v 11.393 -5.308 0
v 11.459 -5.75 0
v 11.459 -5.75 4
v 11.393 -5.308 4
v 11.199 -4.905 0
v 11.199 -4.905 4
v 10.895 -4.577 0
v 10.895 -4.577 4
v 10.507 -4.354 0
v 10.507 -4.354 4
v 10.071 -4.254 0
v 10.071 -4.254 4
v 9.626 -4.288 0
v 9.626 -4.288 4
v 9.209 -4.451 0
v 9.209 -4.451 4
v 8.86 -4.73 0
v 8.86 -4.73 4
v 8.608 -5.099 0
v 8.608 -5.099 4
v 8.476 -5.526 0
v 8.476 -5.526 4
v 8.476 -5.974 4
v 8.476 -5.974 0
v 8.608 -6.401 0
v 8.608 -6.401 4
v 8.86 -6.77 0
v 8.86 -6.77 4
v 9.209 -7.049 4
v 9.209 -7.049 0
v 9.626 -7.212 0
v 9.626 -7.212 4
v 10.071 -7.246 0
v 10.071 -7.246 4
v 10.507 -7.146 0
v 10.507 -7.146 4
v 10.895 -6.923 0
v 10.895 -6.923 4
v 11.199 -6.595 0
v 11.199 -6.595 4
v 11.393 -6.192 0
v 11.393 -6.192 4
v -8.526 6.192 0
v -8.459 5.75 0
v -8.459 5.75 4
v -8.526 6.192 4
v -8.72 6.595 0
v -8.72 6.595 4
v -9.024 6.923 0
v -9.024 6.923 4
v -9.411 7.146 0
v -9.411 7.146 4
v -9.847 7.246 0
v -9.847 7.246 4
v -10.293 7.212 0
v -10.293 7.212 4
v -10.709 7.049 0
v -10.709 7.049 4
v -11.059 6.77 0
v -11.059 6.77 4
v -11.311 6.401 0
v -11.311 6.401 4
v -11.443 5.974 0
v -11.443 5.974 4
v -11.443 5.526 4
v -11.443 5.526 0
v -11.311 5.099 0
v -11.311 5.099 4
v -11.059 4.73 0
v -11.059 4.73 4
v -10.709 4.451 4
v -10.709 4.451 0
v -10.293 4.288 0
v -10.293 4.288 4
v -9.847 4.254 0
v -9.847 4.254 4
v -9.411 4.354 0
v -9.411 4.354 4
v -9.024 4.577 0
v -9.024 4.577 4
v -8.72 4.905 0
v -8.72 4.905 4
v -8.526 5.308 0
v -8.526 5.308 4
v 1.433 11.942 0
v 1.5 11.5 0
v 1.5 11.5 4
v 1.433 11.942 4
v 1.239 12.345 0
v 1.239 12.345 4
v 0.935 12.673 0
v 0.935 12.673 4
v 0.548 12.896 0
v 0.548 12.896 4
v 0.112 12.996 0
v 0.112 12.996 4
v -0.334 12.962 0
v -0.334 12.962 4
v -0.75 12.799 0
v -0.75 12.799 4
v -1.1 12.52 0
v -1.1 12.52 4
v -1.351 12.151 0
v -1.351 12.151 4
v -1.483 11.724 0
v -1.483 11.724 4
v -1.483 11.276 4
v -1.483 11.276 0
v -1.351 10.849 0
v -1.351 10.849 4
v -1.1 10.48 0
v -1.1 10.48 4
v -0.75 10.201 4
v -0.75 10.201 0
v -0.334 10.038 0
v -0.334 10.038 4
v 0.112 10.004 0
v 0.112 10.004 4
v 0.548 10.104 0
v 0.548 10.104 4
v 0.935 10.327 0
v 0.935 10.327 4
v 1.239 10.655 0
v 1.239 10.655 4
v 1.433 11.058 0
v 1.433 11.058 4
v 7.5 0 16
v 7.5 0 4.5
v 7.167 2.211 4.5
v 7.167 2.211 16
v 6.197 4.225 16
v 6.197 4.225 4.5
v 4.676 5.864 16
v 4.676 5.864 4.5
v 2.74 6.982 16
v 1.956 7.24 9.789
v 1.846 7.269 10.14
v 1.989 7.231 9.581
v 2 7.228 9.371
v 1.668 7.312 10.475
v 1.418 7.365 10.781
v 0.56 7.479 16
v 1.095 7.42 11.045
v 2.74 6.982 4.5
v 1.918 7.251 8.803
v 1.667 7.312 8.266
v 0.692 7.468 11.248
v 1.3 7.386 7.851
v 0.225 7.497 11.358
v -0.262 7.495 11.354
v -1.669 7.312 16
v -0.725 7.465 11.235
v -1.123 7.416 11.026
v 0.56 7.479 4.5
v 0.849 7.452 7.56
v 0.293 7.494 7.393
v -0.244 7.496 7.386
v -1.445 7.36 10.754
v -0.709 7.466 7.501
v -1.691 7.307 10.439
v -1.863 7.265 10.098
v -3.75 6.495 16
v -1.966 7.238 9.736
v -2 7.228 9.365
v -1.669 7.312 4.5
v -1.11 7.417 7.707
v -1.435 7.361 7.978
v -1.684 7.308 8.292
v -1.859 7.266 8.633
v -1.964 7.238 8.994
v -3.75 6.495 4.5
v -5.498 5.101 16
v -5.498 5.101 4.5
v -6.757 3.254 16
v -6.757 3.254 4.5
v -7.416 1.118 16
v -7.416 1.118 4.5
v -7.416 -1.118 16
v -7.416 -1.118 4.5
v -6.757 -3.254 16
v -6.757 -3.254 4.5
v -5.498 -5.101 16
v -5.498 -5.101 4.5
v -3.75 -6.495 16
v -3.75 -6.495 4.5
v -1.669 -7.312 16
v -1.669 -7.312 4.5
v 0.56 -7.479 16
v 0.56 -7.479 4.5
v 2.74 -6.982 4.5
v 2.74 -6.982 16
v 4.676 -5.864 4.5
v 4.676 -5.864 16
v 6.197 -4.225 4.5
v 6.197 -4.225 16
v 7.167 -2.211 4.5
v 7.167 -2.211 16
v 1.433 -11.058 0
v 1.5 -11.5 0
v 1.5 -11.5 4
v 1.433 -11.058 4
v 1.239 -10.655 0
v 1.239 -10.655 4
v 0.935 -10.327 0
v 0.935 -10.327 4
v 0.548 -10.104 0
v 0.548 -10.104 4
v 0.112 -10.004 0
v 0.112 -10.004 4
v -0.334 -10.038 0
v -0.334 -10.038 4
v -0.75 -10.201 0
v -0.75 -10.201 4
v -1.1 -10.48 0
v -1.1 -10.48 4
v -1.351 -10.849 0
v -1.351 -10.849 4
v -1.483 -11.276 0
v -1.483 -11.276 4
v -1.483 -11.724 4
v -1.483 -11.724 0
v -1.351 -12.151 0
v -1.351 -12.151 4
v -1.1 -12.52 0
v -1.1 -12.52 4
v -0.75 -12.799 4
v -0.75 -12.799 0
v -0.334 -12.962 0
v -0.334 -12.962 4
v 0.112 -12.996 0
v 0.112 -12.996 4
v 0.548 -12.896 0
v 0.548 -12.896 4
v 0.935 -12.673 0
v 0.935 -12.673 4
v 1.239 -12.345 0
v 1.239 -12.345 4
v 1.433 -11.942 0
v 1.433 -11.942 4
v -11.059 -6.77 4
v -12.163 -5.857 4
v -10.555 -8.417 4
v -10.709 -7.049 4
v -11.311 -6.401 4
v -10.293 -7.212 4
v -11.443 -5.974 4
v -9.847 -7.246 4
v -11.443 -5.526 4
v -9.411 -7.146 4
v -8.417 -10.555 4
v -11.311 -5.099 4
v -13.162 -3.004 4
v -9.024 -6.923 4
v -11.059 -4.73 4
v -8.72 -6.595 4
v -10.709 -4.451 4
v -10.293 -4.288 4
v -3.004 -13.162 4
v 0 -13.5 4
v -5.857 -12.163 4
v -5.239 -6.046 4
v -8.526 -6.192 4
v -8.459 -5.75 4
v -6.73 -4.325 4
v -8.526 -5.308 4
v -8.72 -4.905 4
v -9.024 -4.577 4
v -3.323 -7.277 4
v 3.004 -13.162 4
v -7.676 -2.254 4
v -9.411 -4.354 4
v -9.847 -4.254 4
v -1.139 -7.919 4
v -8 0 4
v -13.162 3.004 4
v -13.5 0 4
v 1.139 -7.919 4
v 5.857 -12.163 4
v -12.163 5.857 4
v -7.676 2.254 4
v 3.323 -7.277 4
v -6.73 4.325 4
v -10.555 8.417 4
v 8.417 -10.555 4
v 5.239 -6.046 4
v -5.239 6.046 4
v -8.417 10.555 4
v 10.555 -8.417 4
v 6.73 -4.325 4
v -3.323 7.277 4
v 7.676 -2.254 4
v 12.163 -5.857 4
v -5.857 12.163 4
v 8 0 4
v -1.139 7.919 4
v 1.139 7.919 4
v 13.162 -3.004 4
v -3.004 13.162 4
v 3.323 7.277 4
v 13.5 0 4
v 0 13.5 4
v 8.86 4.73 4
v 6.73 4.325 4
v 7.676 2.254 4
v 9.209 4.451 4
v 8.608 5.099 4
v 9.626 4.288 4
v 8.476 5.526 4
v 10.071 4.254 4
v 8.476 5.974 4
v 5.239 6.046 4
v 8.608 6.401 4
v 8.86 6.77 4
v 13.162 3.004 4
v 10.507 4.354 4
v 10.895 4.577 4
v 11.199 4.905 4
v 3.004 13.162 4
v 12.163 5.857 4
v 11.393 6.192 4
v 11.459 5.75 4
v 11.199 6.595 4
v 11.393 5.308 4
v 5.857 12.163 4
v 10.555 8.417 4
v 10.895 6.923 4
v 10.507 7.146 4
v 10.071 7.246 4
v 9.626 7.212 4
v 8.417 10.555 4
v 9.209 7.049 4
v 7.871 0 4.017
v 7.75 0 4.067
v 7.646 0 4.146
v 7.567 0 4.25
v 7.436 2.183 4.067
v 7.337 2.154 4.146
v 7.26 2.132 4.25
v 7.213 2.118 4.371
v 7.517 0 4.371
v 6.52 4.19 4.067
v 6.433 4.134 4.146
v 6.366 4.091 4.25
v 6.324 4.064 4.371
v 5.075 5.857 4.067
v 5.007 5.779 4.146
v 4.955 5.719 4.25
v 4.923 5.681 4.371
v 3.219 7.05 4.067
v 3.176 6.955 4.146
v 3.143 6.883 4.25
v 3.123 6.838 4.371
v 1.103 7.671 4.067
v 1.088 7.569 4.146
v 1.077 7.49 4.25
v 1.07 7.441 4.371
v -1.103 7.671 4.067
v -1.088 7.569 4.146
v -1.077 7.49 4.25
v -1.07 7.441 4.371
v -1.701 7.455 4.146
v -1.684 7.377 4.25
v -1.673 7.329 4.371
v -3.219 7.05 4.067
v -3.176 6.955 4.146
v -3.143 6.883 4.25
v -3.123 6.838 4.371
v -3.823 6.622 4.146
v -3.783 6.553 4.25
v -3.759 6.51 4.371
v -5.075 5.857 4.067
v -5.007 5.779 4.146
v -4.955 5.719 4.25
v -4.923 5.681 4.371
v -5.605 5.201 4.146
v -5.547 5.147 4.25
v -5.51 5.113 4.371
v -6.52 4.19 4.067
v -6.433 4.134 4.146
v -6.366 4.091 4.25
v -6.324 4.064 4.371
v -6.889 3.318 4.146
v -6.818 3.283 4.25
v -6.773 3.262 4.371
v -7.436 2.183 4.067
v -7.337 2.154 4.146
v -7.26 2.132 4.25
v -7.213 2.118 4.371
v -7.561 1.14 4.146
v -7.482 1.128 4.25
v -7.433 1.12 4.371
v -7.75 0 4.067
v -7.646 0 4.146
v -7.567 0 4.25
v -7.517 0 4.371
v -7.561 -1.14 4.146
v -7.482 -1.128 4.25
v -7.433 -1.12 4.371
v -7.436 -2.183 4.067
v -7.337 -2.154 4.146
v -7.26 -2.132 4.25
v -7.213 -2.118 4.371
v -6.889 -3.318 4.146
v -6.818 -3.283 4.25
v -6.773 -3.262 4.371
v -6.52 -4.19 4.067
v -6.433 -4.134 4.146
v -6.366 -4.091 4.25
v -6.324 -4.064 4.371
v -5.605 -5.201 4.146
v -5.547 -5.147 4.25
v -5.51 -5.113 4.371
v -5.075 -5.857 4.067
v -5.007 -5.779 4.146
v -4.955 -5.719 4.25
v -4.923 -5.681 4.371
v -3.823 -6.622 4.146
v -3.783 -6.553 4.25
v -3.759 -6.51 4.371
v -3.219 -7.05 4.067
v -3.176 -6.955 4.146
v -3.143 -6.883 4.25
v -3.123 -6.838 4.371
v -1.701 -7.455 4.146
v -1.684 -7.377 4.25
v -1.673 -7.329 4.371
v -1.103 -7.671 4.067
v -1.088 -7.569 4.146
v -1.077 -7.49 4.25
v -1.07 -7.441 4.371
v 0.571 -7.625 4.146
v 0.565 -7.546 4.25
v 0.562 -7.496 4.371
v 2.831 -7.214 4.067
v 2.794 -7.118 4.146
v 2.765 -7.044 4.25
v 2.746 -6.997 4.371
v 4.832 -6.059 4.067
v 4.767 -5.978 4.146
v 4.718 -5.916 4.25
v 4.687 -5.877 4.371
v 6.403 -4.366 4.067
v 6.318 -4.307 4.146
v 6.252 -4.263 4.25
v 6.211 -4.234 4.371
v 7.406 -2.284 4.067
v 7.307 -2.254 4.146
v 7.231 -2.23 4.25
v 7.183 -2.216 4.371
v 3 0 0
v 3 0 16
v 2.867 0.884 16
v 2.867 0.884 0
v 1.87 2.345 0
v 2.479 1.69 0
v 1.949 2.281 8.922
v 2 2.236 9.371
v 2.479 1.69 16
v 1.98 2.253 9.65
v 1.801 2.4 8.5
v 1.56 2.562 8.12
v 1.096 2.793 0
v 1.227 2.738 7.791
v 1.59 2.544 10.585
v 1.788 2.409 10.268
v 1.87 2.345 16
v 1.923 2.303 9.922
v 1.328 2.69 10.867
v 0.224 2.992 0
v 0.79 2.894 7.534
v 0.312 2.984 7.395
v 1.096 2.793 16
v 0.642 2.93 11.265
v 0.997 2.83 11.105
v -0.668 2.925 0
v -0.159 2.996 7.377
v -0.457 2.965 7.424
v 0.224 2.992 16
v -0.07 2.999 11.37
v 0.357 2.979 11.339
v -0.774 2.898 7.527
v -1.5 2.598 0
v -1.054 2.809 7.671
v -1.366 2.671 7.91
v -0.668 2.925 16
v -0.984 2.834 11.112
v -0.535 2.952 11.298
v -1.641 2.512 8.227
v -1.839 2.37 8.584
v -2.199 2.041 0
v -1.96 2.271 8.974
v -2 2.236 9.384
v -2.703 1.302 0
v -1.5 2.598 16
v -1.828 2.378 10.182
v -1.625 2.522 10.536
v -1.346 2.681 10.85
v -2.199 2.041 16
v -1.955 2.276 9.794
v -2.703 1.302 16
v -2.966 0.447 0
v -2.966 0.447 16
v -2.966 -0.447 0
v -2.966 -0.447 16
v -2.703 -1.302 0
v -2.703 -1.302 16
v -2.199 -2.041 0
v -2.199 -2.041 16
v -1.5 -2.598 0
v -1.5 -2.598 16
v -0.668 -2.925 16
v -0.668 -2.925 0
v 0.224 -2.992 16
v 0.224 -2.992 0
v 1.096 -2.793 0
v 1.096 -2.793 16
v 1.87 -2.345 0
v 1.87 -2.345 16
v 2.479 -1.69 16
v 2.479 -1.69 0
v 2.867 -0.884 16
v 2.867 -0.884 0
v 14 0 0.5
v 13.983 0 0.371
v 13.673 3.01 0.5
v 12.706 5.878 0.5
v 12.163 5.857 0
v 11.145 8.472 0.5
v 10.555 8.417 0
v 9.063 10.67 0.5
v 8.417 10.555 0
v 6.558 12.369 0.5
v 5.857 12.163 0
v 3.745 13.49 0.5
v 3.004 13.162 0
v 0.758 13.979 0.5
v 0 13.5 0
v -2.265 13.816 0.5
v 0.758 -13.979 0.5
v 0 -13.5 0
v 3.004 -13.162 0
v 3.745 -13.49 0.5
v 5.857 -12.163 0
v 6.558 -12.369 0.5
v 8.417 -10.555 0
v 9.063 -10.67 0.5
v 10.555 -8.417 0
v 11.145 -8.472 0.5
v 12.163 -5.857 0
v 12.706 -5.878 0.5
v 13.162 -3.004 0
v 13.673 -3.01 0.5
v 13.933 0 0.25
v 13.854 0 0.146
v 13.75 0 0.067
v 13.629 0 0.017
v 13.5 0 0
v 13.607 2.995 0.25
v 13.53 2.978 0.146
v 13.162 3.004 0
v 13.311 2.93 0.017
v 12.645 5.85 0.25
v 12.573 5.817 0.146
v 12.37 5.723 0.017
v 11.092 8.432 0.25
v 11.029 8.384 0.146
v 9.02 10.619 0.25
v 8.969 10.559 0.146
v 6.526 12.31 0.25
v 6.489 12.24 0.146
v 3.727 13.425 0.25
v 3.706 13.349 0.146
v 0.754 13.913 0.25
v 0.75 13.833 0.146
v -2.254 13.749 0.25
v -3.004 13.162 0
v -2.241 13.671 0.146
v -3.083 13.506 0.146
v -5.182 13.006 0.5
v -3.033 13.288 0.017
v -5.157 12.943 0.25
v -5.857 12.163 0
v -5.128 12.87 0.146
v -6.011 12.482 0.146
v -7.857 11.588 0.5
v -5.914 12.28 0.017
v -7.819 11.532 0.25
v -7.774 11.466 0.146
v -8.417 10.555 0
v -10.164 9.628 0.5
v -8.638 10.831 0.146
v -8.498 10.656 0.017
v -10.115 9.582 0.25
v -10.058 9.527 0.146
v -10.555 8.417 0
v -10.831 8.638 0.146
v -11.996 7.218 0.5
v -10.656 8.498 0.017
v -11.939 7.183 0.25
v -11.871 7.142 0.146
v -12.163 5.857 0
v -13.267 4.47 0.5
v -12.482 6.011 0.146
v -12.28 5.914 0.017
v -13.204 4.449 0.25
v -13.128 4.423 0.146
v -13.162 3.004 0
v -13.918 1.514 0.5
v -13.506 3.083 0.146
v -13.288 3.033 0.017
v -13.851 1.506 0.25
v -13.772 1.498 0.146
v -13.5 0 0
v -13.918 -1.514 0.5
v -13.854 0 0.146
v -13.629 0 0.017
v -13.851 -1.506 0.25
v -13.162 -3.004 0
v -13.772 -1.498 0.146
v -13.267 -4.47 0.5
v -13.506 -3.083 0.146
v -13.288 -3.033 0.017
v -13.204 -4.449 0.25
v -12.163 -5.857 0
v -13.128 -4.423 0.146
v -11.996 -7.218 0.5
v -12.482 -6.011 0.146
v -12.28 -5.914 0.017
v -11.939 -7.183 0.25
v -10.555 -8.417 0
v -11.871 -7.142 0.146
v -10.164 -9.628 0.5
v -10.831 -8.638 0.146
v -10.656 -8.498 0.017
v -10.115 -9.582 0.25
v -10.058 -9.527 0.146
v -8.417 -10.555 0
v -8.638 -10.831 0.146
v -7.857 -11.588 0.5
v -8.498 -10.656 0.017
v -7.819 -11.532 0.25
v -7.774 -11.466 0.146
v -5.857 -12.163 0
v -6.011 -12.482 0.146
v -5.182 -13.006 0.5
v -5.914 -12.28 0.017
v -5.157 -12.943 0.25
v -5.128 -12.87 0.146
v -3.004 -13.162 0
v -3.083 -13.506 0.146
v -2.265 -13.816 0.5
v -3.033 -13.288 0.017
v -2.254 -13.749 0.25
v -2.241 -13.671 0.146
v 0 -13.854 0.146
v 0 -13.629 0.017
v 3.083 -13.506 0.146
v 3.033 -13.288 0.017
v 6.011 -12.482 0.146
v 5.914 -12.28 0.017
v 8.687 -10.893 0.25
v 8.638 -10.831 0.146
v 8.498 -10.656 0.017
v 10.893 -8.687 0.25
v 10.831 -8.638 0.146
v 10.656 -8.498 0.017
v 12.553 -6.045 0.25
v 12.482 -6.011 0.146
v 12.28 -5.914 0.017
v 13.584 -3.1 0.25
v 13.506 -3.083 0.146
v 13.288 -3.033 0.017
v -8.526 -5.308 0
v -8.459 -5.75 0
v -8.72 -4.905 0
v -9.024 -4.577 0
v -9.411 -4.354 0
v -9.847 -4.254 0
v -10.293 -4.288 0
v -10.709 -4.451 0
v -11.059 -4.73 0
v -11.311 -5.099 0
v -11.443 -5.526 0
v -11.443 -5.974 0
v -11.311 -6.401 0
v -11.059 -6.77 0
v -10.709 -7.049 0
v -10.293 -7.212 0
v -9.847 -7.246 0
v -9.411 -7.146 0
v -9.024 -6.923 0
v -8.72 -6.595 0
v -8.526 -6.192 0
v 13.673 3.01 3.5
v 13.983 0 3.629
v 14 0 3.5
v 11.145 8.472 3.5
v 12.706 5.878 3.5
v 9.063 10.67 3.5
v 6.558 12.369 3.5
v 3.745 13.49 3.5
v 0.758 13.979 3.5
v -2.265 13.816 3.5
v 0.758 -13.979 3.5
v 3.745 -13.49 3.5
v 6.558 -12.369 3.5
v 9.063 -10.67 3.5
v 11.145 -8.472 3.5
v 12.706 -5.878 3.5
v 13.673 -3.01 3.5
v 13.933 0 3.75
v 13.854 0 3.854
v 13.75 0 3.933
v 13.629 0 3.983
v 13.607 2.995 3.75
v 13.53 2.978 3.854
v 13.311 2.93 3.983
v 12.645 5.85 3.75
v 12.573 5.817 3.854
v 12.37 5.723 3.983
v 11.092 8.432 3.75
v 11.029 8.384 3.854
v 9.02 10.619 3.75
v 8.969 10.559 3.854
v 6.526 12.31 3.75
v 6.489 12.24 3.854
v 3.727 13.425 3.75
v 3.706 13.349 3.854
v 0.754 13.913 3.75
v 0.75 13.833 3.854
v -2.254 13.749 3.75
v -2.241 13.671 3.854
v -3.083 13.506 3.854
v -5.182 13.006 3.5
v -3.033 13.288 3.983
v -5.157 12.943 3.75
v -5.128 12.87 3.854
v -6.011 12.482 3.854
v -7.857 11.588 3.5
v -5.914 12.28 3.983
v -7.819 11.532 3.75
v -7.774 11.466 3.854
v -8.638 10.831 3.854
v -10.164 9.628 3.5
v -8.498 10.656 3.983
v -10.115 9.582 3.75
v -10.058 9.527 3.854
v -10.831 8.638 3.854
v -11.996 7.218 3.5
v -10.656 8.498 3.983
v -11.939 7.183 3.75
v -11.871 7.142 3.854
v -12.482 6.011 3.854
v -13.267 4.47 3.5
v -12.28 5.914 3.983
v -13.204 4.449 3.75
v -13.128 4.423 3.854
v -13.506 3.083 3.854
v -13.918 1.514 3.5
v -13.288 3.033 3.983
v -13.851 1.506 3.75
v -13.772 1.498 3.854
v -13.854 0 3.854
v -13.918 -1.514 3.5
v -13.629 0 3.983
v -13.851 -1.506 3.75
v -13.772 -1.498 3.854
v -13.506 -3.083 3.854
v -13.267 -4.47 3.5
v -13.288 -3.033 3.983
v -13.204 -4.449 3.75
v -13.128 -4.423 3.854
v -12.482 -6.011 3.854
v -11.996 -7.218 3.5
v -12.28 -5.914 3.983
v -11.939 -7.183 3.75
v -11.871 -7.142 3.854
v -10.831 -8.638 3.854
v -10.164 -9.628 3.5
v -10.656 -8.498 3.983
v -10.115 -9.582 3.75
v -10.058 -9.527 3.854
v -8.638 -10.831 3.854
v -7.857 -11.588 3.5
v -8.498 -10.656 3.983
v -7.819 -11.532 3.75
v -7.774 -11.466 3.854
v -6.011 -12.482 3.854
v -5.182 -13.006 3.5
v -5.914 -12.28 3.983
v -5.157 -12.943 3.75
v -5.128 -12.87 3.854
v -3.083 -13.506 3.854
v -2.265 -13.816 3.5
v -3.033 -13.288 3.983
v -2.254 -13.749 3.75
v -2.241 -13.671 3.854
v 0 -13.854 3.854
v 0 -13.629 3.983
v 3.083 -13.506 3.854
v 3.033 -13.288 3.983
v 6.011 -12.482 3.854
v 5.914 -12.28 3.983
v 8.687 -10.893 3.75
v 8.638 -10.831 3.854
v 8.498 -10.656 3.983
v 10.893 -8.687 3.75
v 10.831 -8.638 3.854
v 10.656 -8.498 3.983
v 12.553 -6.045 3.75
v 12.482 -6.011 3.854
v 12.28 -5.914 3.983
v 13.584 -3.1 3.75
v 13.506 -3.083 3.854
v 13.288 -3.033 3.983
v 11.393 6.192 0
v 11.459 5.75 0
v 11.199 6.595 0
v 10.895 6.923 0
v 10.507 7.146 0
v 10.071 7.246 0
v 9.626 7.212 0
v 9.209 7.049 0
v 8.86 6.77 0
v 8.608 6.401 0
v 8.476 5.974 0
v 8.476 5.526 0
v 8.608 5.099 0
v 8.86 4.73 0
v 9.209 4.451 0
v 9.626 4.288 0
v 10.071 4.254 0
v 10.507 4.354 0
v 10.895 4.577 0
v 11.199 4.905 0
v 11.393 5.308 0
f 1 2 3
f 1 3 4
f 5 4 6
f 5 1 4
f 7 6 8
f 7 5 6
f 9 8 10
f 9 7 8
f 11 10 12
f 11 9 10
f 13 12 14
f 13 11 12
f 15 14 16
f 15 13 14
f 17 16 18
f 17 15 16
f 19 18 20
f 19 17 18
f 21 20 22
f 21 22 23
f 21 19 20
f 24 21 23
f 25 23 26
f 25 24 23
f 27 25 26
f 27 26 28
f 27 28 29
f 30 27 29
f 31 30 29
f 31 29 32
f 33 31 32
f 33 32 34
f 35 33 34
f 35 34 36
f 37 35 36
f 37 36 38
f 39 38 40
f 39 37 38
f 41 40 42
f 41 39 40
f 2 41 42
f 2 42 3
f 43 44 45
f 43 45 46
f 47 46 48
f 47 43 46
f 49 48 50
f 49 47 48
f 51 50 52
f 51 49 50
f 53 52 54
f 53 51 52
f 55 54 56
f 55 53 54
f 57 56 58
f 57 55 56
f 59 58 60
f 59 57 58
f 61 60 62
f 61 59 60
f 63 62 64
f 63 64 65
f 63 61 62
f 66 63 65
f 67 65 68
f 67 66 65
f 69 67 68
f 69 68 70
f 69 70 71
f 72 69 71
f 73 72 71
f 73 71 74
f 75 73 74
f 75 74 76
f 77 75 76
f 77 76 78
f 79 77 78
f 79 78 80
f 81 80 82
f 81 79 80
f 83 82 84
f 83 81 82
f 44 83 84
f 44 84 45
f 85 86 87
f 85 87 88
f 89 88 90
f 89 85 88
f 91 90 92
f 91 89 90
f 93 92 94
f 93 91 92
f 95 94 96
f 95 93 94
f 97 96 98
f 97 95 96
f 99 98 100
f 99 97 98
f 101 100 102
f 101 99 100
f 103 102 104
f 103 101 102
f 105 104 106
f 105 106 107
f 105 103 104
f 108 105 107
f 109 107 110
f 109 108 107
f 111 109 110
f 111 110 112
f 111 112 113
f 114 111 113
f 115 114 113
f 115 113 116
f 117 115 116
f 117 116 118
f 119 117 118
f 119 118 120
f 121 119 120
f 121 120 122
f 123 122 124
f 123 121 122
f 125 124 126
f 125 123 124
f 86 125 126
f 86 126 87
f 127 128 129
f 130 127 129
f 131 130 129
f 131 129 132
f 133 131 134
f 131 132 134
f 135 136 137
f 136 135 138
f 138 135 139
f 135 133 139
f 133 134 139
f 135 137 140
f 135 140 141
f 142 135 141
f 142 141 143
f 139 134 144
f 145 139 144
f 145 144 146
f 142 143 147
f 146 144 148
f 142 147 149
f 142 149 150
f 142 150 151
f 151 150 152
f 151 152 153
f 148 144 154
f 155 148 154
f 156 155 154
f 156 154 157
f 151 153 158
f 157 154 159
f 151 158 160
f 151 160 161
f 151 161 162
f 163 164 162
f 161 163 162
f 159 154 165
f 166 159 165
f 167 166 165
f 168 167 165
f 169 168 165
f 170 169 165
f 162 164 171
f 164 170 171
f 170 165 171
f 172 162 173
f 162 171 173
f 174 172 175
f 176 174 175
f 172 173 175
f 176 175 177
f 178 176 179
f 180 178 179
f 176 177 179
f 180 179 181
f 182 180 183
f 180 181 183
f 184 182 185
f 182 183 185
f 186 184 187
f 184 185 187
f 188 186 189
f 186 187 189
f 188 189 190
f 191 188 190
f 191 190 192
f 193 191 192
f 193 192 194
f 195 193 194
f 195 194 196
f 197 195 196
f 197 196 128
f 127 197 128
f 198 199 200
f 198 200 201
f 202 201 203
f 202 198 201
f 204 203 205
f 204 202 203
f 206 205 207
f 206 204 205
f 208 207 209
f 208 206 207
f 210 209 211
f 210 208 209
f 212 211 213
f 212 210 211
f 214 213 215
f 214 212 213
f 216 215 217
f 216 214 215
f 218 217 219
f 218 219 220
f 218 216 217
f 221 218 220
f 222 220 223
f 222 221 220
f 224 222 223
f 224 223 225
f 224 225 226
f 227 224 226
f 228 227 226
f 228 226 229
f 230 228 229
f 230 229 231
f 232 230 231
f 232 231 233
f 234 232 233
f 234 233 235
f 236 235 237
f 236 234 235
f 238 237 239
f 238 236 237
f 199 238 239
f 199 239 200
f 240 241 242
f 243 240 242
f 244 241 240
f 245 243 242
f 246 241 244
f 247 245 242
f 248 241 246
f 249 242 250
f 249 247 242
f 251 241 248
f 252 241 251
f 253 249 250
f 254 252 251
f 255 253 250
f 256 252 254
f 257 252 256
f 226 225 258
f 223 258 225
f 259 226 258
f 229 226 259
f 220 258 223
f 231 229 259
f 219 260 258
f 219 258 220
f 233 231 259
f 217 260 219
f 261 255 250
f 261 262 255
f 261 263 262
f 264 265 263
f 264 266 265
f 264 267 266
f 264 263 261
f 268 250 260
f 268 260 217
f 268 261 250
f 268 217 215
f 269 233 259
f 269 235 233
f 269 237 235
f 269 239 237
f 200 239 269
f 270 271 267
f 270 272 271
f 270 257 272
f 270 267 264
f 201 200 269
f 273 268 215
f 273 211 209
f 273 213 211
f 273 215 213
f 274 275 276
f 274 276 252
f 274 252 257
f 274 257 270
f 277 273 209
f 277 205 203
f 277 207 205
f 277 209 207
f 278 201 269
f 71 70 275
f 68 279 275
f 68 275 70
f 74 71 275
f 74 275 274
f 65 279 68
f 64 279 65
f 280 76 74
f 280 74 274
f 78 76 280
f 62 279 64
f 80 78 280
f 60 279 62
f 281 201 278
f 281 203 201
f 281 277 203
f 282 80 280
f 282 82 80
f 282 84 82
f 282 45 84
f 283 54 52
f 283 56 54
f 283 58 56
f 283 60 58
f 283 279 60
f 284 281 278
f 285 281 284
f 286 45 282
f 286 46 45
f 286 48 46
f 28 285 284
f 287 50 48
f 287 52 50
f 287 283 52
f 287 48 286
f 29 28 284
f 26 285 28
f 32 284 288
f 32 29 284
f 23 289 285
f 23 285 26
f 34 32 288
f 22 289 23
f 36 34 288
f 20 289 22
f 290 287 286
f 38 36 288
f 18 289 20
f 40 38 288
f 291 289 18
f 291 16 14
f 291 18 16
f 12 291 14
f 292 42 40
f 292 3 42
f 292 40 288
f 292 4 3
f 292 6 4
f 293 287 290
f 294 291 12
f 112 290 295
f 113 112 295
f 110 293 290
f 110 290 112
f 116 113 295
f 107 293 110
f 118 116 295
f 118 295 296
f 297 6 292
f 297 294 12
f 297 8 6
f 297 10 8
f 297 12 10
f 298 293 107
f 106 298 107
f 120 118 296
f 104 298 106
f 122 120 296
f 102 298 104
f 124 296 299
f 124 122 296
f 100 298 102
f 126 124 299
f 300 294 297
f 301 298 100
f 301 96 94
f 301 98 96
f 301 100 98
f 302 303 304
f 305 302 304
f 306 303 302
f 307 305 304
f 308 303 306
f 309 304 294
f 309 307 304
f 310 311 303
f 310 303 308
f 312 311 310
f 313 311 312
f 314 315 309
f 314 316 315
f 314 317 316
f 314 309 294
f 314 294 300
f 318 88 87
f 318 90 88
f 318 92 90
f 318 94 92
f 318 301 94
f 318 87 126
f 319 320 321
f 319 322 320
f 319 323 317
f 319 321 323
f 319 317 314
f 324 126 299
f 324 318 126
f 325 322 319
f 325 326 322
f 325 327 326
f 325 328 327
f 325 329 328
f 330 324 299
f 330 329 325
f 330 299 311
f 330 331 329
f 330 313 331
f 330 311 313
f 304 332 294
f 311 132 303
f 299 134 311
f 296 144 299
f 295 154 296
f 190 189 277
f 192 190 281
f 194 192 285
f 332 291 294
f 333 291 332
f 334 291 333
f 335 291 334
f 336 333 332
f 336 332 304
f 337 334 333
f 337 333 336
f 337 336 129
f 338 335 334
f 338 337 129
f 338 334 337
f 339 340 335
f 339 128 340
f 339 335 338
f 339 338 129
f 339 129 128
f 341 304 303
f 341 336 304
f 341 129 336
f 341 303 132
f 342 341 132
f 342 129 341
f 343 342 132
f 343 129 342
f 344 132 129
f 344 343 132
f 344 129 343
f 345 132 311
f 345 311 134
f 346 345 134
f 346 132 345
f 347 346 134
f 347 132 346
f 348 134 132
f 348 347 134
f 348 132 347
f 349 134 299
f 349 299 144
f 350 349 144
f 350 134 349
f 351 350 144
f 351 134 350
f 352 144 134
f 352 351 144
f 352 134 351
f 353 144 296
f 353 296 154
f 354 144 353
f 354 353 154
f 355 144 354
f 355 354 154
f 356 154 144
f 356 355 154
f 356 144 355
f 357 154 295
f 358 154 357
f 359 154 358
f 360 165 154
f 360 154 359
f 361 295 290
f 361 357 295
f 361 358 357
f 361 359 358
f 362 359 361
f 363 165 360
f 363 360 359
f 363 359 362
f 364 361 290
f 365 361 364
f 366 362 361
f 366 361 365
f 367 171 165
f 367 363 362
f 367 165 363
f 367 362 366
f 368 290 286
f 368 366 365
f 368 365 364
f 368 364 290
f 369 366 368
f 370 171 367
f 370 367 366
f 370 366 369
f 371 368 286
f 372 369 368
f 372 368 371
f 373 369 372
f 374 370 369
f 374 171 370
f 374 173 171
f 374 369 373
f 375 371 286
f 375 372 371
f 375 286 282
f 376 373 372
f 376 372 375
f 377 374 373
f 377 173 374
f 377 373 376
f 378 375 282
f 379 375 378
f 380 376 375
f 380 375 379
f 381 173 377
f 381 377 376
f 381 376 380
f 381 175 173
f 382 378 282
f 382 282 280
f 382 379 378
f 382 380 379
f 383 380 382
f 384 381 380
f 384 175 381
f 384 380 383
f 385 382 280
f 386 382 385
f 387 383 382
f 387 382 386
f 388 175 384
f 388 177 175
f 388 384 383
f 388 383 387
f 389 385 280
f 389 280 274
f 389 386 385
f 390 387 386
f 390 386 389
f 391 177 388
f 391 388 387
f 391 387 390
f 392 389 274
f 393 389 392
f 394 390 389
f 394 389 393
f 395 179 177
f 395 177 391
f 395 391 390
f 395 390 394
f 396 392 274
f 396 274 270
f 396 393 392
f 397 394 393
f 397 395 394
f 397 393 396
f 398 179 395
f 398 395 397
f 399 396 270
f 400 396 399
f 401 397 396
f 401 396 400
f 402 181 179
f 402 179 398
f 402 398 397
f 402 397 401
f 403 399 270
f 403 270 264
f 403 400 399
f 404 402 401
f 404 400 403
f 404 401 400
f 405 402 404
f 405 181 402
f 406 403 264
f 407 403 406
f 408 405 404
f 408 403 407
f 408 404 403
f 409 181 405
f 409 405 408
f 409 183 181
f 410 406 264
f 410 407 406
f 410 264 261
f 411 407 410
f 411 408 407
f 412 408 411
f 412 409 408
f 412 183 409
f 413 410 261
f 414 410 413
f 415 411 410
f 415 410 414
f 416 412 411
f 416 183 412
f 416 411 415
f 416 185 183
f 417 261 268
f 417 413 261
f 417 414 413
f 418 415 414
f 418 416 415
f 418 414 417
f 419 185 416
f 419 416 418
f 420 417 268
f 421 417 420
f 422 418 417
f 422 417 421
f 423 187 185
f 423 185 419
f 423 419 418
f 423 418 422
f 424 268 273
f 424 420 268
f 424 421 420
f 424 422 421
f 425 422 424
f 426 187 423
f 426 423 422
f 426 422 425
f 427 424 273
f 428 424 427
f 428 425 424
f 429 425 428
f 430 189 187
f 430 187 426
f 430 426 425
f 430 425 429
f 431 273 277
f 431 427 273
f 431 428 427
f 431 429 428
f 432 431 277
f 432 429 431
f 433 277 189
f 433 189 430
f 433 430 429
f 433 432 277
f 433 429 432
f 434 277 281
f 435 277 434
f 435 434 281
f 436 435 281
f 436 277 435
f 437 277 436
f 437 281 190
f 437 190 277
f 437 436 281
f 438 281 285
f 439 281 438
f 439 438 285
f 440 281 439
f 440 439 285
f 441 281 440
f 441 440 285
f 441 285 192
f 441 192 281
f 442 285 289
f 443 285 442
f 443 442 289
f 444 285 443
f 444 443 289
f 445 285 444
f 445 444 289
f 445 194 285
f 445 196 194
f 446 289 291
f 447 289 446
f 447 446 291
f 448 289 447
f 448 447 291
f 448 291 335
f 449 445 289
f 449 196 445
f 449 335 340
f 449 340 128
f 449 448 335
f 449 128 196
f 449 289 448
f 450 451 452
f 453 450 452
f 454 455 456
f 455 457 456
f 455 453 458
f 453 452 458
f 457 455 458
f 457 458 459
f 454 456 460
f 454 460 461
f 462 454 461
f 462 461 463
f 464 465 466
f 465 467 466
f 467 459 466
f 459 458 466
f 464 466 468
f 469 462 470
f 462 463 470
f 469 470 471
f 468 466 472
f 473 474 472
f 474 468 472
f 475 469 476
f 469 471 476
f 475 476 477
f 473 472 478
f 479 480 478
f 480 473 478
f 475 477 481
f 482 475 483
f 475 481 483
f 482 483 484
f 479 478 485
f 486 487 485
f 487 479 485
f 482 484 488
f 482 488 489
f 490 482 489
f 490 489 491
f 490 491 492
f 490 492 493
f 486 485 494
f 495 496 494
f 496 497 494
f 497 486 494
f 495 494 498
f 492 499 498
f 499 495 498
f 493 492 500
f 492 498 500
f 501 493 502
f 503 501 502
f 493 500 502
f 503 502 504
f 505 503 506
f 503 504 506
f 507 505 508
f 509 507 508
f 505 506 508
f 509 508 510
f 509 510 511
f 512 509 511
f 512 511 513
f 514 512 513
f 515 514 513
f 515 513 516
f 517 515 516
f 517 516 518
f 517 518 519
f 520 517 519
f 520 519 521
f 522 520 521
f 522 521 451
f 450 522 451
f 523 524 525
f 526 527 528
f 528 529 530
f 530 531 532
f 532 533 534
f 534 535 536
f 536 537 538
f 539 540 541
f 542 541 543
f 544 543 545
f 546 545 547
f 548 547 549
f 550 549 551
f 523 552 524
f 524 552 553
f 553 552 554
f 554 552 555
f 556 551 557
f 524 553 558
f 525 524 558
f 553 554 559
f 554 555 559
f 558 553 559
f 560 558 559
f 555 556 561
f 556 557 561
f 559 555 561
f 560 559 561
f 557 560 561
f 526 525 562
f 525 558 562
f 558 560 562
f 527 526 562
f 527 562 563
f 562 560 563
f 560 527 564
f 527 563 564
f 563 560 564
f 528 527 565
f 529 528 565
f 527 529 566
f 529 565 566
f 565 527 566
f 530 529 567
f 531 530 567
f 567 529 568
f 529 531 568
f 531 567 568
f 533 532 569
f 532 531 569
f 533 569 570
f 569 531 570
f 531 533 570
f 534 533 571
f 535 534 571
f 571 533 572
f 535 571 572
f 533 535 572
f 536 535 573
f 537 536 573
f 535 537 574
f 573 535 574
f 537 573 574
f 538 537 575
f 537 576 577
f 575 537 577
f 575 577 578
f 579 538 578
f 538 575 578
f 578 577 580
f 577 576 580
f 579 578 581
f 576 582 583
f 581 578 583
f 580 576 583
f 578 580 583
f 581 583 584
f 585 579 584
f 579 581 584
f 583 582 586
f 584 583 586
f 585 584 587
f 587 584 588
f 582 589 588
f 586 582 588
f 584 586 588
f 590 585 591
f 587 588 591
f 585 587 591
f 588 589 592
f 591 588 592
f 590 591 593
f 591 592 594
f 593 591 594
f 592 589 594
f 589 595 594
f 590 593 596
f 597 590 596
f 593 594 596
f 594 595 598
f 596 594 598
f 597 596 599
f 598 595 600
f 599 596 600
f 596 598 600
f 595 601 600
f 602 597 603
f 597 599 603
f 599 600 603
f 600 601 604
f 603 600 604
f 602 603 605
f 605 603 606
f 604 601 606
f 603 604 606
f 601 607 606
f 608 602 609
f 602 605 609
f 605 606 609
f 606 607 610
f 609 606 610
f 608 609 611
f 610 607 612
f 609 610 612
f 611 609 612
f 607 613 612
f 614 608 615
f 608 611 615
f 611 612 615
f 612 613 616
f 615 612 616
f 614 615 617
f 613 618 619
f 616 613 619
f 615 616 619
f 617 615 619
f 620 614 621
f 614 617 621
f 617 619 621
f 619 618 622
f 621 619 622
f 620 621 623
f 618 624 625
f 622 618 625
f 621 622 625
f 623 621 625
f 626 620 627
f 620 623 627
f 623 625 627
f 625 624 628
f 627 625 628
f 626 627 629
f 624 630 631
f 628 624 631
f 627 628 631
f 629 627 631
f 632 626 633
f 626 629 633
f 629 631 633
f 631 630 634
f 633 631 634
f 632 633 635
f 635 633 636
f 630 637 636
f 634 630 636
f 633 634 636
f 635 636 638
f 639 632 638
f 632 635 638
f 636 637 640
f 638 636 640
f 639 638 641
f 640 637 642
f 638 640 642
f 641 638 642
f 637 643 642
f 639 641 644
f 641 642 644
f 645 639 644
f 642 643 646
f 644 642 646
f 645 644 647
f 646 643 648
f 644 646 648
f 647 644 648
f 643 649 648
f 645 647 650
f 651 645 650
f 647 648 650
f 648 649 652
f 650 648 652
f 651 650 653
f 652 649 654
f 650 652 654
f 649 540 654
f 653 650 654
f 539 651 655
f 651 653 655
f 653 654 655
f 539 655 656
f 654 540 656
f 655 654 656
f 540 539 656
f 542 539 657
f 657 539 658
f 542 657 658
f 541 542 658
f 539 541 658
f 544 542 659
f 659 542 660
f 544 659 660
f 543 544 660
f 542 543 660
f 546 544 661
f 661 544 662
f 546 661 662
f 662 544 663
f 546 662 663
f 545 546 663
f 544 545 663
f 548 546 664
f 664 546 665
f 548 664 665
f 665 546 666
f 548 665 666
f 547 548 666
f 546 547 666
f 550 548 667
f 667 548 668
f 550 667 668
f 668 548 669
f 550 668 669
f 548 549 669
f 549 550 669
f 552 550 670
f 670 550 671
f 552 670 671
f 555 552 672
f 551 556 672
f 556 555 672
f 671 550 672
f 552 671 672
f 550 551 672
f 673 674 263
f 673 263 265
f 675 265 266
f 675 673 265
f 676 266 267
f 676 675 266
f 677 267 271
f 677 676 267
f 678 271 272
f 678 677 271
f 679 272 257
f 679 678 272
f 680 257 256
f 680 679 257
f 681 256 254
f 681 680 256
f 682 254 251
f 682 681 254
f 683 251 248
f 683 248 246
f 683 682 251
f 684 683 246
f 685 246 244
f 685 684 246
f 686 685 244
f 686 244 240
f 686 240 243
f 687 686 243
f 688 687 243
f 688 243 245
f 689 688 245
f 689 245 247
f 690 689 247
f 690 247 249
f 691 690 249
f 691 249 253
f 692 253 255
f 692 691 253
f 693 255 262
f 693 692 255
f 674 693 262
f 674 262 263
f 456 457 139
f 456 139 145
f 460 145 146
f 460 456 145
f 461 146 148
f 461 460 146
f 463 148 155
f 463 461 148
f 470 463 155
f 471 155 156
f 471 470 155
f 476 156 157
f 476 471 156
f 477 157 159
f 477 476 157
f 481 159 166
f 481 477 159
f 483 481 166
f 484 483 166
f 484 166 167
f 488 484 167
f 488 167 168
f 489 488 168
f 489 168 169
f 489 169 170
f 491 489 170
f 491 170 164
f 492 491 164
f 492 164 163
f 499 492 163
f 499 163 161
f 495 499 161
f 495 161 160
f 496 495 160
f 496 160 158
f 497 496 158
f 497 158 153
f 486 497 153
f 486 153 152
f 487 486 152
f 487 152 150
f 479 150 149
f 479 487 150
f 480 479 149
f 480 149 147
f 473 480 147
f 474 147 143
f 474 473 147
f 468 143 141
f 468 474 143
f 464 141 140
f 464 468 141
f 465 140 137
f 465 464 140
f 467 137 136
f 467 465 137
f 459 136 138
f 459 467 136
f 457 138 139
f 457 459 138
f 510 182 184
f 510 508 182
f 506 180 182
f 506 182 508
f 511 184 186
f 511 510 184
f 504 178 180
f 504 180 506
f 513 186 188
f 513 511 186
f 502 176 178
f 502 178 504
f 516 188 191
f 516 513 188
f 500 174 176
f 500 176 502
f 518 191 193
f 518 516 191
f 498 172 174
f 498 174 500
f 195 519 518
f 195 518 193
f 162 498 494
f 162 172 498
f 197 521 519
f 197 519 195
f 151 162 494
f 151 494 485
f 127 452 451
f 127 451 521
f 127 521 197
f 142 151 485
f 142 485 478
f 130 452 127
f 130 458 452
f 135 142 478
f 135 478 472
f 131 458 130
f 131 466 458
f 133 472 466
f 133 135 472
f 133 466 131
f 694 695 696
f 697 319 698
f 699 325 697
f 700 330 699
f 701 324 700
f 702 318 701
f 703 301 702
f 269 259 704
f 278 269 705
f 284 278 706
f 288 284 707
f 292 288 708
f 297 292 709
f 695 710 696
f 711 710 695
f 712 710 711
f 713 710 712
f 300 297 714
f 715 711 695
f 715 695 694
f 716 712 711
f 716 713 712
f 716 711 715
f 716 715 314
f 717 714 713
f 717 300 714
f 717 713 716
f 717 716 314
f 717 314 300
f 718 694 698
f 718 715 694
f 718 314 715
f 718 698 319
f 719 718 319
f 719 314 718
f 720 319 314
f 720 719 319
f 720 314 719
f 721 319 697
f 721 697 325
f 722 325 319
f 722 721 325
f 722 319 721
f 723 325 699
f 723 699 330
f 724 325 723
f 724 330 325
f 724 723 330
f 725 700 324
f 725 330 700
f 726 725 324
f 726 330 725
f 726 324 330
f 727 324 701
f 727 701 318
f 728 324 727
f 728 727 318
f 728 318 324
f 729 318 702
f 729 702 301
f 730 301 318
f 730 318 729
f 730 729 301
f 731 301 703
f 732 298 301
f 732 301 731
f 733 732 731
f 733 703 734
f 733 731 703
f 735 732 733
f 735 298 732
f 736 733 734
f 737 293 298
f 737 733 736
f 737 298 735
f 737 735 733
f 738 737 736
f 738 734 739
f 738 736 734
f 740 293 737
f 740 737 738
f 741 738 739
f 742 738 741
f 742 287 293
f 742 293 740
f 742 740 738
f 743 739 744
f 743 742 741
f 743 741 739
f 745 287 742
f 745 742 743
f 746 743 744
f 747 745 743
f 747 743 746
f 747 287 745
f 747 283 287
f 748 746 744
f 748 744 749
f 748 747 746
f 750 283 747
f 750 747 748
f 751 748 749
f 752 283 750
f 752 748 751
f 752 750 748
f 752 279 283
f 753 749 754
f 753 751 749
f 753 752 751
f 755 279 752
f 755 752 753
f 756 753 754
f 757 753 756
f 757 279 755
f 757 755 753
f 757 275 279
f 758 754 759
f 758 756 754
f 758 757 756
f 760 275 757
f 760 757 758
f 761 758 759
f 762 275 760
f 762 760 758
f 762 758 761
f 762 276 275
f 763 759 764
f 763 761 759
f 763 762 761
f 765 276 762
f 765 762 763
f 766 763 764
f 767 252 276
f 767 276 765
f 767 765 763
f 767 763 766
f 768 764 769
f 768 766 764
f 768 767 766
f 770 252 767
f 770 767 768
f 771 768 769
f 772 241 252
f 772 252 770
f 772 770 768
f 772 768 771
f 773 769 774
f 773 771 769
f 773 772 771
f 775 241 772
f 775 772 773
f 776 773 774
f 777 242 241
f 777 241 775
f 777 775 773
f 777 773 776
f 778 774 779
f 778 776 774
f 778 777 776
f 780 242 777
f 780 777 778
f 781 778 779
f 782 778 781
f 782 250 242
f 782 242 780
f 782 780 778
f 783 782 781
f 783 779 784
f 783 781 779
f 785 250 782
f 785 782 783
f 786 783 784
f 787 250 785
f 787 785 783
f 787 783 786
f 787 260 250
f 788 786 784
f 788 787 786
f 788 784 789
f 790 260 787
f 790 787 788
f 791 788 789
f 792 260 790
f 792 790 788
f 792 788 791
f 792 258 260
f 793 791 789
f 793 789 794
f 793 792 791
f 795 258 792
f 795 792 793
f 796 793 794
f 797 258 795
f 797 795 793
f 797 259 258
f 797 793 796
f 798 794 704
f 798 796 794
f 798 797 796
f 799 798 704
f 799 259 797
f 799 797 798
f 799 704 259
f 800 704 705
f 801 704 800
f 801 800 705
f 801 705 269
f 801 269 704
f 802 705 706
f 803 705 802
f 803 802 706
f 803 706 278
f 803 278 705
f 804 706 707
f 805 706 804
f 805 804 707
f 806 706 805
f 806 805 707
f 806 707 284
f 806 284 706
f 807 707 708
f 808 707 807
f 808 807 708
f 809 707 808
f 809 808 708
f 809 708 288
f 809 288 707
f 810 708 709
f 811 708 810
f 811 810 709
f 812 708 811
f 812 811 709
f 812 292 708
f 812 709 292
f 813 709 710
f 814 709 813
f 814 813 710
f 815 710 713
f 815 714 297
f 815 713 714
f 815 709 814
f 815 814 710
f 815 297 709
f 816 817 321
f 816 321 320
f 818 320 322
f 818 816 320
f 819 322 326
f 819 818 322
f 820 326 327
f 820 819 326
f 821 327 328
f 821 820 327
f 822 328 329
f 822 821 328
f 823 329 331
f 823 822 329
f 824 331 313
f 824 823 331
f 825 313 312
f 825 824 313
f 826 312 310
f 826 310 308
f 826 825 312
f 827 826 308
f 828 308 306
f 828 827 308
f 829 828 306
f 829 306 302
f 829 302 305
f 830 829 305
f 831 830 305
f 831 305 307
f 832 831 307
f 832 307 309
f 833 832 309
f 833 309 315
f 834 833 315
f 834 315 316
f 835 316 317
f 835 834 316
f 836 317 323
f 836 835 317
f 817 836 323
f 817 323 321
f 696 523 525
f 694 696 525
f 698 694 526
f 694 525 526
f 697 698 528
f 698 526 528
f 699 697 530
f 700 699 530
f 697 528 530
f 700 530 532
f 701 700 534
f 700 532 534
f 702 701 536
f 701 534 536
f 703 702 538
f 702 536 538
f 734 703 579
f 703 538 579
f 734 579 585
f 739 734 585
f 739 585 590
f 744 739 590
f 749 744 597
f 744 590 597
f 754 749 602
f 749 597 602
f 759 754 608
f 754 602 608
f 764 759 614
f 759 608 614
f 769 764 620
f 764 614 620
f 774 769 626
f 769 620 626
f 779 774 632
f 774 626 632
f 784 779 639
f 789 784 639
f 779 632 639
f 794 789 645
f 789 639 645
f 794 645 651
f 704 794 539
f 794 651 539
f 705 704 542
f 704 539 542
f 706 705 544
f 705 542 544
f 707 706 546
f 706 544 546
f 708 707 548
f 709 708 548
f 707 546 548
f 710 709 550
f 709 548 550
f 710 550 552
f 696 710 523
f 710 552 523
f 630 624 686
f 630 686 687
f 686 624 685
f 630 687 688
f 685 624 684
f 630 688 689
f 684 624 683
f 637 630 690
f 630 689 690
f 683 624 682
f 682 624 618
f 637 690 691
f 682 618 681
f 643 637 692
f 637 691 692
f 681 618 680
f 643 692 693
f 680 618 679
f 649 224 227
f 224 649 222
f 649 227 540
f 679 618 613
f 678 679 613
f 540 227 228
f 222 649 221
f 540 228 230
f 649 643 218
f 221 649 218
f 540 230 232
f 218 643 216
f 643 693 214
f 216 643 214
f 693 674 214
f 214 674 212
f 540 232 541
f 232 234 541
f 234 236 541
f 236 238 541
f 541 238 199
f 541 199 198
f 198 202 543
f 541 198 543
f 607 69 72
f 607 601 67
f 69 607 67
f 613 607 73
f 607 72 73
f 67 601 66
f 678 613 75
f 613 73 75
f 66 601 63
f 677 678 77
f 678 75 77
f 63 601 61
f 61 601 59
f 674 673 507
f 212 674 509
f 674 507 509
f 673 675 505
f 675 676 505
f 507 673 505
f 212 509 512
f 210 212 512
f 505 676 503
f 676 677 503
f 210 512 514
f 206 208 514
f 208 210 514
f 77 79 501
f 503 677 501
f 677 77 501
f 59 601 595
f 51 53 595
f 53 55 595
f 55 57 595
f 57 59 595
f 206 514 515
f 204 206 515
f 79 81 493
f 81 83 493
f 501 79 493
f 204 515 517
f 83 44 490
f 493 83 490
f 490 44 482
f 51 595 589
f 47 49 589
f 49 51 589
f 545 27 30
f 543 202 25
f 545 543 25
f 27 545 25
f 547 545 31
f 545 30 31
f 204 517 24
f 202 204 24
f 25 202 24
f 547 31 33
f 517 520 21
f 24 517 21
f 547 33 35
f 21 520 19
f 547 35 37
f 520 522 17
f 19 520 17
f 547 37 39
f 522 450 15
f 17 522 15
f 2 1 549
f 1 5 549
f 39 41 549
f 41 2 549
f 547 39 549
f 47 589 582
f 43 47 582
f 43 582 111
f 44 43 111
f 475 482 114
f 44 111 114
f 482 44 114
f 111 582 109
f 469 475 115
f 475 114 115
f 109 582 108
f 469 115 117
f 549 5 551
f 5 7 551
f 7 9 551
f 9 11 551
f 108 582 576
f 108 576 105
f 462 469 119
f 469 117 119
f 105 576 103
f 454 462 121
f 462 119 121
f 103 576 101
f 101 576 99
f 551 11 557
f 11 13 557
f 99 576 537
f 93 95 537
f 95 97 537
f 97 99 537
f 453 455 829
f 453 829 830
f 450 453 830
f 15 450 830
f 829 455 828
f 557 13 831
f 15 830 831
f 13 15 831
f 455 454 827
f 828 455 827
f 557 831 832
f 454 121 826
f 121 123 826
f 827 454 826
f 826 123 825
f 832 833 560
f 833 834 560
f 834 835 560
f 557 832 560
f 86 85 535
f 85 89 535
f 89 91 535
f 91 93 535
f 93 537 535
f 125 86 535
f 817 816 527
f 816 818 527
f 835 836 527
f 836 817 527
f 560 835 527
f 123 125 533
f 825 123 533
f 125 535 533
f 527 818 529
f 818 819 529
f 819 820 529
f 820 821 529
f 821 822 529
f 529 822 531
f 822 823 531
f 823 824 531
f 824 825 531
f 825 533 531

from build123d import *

# Parameters (mm, degrees)
SKETCH_1_R          = 14
SKETCH_1_R_2        = 1.5
EXTRUDE_1_DEPTH     = 4
SKETCH_2_R          = 7.5
EXTRUDE_2_DEPTH     = 12
SKETCH_3_R          = 3
CUT_EXTRUDE_1_DEPTH = 17
FILLET_1_R          = 0.5
FILLET_2_R          = 0.5
SKETCH_4_R          = 2
CUT_EXTRUDE_3_DEPTH = 15.0000001


with BuildPart() as part:
    # 草图1 → 凸台-拉伸1 (new body)
    with BuildSketch(Plane.XY):
        Circle(SKETCH_1_R)
        with Locations((0, 11.5)):
            Circle(SKETCH_1_R_2, mode=Mode.SUBTRACT)
        with Locations((9.959292144, 5.75)):
            Circle(SKETCH_1_R_2, mode=Mode.SUBTRACT)
        with Locations((9.959292144, -5.75)):
            Circle(SKETCH_1_R_2, mode=Mode.SUBTRACT)
        with Locations((0, -11.5)):
            Circle(SKETCH_1_R_2, mode=Mode.SUBTRACT)
        with Locations((-9.959292144, -5.75)):
            Circle(SKETCH_1_R_2, mode=Mode.SUBTRACT)
        with Locations((-9.959292144, 5.75)):
            Circle(SKETCH_1_R_2, mode=Mode.SUBTRACT)
    extrude(amount=EXTRUDE_1_DEPTH)

    # 草图2 → 凸台-拉伸2 (add)
    with BuildSketch(Plane.XY.offset(4)):
        Circle(SKETCH_2_R)
    extrude(amount=EXTRUDE_2_DEPTH)

    # 草图3 → 切除-拉伸1 (cut, through all)
    with BuildSketch(Plane.XY.offset(16)):
        Circle(SKETCH_3_R)
    extrude(amount=-CUT_EXTRUDE_1_DEPTH, mode=Mode.SUBTRACT)

    # 圆角1
    fillet_1_edges = [part.edges().sort_by_distance(p)[0] for p in [
        (-14, 0, 0),
        (-14, 0, 4),
    ]]
    fillet(fillet_1_edges, radius=FILLET_1_R)

    # 圆角2
    fillet_2_edges = [part.edges().sort_by_distance(p)[0] for p in [
        (-7.5, 0, 4),
    ]]
    fillet(fillet_2_edges, radius=FILLET_2_R)

    # 草图4 → 切除-拉伸3 (cut, through all)
    with BuildSketch(Plane(origin=(0, 0, 0), x_dir=(1, 0, 0), z_dir=(0, 1, 0))):
        with Locations((0, -9.370984313)):
            Circle(SKETCH_4_R)
    extrude(amount=CUT_EXTRUDE_3_DEPTH, mode=Mode.SUBTRACT)


solid = part.part
